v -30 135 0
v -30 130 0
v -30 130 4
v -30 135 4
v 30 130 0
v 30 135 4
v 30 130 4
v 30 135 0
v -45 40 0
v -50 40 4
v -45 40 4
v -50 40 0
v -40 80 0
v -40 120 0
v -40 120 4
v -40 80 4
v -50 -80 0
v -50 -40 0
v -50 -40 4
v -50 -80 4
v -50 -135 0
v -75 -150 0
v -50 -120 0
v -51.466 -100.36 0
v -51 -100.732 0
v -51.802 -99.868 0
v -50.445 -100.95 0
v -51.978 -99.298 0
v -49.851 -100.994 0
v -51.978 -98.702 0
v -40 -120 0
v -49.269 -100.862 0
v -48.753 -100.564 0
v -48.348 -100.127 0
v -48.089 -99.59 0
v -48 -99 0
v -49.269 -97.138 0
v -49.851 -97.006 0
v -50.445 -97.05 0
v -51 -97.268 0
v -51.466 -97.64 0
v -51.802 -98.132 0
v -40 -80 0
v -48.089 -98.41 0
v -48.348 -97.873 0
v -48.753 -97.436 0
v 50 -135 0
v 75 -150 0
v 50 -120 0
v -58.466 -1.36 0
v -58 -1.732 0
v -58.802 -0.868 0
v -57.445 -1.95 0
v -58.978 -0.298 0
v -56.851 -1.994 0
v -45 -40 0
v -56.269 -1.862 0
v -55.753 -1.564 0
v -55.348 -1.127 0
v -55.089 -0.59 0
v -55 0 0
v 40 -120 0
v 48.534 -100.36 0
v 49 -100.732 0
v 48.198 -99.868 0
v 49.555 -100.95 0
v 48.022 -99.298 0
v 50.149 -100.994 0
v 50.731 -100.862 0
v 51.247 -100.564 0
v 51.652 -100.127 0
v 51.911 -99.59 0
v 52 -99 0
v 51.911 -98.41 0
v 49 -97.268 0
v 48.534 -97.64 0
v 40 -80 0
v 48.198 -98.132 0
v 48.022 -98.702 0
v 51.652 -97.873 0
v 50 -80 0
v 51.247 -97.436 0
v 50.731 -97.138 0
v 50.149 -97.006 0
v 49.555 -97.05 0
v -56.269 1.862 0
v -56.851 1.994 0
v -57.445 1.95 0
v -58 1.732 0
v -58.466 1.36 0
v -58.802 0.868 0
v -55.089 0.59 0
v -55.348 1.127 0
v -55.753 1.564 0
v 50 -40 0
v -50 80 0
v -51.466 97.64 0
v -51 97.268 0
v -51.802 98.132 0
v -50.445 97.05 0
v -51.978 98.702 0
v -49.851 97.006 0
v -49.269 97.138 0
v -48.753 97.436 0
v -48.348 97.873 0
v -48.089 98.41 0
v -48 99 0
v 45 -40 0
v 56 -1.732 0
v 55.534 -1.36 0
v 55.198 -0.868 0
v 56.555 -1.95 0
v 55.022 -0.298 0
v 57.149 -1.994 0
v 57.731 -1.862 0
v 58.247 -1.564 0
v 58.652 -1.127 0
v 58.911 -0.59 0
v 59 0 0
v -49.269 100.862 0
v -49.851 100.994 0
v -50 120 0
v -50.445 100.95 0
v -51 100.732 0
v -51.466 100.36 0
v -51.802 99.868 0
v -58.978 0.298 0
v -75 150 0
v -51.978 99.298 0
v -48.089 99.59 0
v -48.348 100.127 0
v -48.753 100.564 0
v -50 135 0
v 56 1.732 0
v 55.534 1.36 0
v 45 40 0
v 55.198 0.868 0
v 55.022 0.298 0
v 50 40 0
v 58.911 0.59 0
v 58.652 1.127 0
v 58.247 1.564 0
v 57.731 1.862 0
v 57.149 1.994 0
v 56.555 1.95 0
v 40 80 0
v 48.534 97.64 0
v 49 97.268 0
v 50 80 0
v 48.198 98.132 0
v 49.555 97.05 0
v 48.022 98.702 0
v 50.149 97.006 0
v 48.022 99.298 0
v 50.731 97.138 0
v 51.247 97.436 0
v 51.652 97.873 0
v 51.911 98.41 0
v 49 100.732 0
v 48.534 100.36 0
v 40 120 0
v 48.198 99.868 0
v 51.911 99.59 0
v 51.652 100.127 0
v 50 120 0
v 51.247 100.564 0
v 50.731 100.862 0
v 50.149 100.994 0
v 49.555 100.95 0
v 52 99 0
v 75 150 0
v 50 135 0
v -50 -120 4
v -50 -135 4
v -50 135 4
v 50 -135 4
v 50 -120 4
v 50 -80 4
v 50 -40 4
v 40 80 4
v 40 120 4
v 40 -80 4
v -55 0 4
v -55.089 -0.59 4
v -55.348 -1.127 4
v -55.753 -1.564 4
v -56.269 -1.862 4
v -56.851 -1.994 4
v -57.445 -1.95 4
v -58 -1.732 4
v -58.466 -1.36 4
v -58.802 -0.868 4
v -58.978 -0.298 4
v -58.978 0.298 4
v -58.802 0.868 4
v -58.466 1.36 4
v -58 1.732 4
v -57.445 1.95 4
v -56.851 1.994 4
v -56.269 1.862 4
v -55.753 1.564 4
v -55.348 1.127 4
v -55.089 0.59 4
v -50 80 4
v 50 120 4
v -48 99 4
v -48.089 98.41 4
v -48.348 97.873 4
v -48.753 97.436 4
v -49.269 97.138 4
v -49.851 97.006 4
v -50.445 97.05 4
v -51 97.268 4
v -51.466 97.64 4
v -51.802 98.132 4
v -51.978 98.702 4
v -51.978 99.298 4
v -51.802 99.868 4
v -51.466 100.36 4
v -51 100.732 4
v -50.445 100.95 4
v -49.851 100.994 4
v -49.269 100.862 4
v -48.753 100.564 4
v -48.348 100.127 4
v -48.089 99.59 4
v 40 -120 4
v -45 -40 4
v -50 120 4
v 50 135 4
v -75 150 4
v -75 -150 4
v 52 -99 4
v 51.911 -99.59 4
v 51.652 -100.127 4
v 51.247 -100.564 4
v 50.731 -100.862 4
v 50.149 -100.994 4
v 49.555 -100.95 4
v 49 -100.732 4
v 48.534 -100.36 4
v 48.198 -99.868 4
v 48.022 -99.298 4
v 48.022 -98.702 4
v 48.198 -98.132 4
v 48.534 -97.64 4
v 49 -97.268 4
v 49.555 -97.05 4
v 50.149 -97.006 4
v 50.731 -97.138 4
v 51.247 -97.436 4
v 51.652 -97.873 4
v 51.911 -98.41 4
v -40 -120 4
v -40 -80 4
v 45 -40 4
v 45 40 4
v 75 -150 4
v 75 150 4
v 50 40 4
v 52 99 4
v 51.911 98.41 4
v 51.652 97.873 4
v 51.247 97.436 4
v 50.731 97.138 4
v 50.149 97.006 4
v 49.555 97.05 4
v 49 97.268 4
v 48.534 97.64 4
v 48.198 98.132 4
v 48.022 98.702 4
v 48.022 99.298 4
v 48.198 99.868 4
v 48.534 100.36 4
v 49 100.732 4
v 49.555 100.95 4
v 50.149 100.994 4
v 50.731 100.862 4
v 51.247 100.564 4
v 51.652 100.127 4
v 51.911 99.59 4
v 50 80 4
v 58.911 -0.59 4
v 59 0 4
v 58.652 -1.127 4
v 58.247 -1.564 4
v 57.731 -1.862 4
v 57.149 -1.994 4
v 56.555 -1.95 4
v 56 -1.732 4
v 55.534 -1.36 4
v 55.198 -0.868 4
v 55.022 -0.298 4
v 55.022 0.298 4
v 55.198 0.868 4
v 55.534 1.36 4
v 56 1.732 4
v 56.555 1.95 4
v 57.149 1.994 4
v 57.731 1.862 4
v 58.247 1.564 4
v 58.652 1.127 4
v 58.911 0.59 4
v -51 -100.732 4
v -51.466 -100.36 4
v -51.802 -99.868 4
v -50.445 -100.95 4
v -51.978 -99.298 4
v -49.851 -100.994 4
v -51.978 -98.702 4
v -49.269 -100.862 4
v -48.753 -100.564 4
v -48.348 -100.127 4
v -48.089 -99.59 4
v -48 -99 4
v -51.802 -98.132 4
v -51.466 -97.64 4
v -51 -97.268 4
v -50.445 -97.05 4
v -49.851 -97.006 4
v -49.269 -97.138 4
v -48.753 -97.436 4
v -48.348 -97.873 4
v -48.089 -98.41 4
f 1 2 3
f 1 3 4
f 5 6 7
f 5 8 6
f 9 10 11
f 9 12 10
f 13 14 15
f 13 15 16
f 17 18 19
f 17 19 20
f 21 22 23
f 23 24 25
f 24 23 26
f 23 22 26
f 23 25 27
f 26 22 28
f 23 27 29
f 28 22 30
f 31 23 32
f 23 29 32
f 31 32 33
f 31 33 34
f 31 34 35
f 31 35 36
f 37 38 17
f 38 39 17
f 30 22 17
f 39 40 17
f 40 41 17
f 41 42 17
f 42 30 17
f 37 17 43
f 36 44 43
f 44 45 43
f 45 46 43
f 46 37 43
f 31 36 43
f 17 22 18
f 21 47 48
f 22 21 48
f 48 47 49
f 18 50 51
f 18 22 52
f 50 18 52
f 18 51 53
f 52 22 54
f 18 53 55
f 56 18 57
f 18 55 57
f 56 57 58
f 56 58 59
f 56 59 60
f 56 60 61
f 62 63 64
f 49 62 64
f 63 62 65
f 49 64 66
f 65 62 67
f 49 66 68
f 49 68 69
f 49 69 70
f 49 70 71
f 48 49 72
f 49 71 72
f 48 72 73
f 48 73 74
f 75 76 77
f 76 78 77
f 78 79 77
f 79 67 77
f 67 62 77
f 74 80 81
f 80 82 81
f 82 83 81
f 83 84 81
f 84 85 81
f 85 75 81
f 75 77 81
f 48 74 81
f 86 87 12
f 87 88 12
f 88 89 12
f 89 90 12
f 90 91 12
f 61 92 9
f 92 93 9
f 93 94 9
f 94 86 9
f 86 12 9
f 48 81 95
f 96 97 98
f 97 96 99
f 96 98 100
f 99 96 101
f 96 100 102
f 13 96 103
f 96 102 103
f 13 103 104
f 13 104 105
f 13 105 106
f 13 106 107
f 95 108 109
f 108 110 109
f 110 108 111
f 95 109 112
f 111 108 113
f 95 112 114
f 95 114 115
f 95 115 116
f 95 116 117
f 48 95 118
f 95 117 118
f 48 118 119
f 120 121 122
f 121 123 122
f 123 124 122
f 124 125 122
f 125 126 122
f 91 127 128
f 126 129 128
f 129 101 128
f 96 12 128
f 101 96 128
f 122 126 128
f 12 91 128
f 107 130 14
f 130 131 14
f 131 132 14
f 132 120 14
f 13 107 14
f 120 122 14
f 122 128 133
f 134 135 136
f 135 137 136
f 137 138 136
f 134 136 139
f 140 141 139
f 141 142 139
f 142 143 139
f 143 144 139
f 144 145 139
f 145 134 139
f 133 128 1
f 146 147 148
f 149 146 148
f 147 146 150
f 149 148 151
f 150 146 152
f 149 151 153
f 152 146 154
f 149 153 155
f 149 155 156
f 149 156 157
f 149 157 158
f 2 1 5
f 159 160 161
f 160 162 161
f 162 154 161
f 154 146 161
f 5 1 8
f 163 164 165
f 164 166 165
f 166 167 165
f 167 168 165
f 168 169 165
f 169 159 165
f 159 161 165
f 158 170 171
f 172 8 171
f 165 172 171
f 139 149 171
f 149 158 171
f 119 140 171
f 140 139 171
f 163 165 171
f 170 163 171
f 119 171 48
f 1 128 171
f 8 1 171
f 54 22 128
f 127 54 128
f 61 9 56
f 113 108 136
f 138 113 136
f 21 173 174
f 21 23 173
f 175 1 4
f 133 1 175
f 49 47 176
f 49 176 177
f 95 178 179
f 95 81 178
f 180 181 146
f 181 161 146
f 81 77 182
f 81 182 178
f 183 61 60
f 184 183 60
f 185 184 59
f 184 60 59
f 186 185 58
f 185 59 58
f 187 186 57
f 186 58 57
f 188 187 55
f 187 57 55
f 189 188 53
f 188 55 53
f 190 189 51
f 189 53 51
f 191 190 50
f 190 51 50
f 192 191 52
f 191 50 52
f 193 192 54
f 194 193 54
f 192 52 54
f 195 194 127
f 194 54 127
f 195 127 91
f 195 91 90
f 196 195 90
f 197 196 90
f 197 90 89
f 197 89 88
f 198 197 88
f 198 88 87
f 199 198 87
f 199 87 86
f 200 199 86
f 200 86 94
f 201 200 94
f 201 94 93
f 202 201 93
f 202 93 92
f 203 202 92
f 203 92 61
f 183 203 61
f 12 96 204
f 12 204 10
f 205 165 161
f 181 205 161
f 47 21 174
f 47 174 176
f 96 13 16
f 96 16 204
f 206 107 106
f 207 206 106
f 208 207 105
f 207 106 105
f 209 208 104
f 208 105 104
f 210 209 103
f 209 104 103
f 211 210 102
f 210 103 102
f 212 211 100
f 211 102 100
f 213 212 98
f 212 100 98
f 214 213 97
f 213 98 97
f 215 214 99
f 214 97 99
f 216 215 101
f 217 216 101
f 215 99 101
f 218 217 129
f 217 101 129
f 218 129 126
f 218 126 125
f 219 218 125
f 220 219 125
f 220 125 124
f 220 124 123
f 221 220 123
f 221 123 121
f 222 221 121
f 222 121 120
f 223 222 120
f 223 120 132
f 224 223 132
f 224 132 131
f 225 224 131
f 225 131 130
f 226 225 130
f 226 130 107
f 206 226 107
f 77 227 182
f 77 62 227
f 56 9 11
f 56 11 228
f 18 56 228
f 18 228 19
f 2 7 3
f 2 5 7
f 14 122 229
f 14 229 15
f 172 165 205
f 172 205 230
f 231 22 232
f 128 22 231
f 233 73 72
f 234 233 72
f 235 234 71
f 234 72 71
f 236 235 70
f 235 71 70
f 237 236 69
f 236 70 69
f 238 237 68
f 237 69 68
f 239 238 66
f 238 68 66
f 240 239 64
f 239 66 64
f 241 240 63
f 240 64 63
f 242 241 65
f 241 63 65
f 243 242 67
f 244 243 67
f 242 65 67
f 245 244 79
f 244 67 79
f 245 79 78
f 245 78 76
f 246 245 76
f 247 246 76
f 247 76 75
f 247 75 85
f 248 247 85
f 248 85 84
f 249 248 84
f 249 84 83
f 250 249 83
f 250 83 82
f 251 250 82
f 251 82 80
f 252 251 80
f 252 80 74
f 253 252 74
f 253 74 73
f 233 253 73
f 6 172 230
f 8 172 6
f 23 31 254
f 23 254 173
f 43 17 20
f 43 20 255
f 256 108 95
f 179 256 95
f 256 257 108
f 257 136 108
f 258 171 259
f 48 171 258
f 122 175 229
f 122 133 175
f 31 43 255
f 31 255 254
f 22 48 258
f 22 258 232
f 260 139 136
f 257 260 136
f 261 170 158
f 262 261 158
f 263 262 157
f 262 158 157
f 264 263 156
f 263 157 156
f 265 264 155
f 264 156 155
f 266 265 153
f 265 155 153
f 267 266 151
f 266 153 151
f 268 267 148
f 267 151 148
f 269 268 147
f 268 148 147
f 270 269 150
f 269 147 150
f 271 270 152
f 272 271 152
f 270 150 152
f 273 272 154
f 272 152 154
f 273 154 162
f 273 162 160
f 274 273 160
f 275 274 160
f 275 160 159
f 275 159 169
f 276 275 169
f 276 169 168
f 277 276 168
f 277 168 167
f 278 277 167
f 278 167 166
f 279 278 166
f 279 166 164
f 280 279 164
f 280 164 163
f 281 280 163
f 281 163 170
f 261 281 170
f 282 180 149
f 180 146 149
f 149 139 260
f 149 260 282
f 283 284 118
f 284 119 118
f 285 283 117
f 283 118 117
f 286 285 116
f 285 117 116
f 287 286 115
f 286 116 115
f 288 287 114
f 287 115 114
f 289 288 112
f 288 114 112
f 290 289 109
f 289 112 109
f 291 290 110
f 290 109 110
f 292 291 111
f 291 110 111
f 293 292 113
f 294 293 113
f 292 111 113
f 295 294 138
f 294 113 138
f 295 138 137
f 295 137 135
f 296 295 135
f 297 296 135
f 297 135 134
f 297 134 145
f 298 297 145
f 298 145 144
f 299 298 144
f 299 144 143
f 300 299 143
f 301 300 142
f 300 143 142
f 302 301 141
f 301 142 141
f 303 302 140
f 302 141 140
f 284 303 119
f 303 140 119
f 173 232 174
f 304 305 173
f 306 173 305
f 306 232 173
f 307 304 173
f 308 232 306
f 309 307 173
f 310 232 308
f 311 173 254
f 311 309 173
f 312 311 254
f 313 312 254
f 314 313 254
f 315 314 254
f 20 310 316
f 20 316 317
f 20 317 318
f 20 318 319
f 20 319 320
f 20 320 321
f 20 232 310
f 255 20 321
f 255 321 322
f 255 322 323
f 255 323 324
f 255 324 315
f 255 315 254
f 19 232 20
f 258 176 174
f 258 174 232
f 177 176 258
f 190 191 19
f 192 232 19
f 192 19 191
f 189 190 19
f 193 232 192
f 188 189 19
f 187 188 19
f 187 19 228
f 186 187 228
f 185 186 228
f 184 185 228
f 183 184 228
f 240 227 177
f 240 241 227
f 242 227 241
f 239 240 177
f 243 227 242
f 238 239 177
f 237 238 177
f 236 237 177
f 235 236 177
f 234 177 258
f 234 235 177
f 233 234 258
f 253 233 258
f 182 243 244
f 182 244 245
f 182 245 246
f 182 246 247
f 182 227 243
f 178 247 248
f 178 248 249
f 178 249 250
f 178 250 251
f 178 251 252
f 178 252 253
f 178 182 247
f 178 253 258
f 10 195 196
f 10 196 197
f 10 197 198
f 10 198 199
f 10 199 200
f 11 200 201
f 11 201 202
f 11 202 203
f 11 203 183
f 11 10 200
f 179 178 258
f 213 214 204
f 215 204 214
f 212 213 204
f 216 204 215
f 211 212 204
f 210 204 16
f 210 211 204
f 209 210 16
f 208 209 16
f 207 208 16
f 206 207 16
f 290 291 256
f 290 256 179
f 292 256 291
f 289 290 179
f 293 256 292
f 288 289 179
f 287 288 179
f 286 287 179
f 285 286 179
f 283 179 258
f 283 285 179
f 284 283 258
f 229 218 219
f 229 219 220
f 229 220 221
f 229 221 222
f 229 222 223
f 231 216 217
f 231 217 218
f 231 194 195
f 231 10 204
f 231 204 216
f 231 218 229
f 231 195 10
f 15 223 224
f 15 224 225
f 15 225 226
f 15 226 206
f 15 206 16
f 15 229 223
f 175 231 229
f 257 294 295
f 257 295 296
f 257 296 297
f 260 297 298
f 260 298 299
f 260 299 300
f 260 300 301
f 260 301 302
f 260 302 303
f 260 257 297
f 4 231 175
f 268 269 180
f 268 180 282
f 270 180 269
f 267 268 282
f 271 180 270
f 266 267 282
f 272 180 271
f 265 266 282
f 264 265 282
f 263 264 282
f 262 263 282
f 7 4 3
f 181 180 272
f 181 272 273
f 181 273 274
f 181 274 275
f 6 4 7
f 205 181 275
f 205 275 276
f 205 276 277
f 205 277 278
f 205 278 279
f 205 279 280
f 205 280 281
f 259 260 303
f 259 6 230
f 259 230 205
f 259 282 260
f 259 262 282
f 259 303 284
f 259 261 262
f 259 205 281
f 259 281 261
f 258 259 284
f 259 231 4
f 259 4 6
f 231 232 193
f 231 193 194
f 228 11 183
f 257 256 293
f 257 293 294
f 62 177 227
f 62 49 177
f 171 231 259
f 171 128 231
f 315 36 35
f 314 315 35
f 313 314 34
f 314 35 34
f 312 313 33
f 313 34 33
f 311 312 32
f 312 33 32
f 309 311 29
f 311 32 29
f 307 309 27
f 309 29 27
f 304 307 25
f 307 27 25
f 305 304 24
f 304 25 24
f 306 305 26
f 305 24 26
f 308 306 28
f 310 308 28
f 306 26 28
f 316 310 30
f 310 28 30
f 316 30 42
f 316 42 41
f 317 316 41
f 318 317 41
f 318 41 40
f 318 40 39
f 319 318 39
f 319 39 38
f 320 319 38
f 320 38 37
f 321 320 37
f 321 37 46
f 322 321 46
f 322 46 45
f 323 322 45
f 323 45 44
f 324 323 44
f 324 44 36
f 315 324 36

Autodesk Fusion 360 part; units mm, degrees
sketch "Sketch1" plane through (0, 0, 0) normal (0, 0, 1) x (1, 0, 0)
  line L0 (-75, 150) -> (75, 150)
  line L1 (75, 150) -> (75, -150)
  line L2 (75, -150) -> (-75, -150)
  line L3 (-75, -150) -> (-75, 150)
  line L4 (-75, 150) -> (75, -150) construction
  line L5 (75, 150) -> (-75, -150) construction
  line L6 (50, 135) -> (-50, 135)
  line L7 (-50, 135) -> (-50, -135)
  line L8 (-50, -135) -> (50, -135)
  line L9 (50, -135) -> (50, 135)
  line L10 (50, 135) -> (-50, -135) construction
  line L11 (-50, 135) -> (50, -135) construction
  line L12 (-30, 135) -> (30, 135)
  line L13 (30, 135) -> (30, 130)
  line L14 (30, 130) -> (-30, 130)
  line L15 (-30, 130) -> (-30, 135)
  line L16 (-50, 40) -> (-45, 40)
  line L17 (-45, 40) -> (-45, -40)
  line L18 (-45, -40) -> (-50, -40)
  line L19 (-50, -40) -> (-50, 40)
  line L20 (-30, -135) -> (30, -135)
  line L21 (30, -135) -> (30, -130)
  line L22 (30, -130) -> (-30, -130)
  line L23 (-30, -130) -> (-30, -135)
  line L24 (50, 40) -> (45, 40)
  line L25 (45, 40) -> (45, -40)
  line L26 (45, -40) -> (50, -40)
  line L27 (50, -40) -> (50, 40)
  line L28 (-50, -80) -> (-40, -80)
  line L29 (-40, -80) -> (-40, -120)
  line L30 (-40, -120) -> (-50, -120)
  line L31 (-50, -120) -> (-50, -80)
  line L32 (50, -120) -> (40, -120)
  line L33 (40, -120) -> (40, -80)
  line L34 (40, -80) -> (50, -80)
  line L35 (50, -80) -> (50, -120)
  line L36 (50, 120) -> (40, 120)
  line L37 (40, 120) -> (40, 80)
  line L38 (40, 80) -> (50, 80)
  line L39 (50, 80) -> (50, 120)
  line L40 (-50, 120) -> (-40, 120)
  line L41 (-40, 120) -> (-40, 80)
  line L42 (-40, 80) -> (-50, 80)
  line L43 (-50, 80) -> (-50, 120)
  dimension "d1" = 300
  dimension "d2" = 150
  dimension "d3" = 270
  dimension "d4" = 100
  dimension "d5" = 60
  dimension "d6" = 20
  dimension "d7" = 5
  dimension "d8" = 80
  dimension "d9" = 95
  dimension "d10" = 5
  dimension "d11" = 60
  dimension "d12" = 5
  dimension "d13" = 20
  dimension "d14" = 80
  dimension "d15" = 5
  dimension "d16" = 95
  dimension "d19" = 10
  dimension "d20" = 40
  dimension "d21" = 40
  dimension "d22" = 10
  dimension "d23" = 40
  dimension "d24" = 40
  dimension "d25" = 10
  dimension "d26" = 40
  dimension "d27" = 40
  dimension "d28" = 10
  dimension "d29" = 40
  dimension "d30" = 40
extrude "Extrude2" add sketch "Sketch1" along normal blind 4 contours L0 L1 L2 L3 | L6 L12 L13 L14 L15 | L9 L36 L37 L38 L39 | L9 L24 L25 L26 L27 | L7 L40 L41 L42 L43 | L9 L32 L33 L34 L35 | L7 L16 L17 L18 L19 | L7 L28 L29 L30 L31
sketch "Sketch2" plane through (0, 0, 0) normal (0, 0, 1) x (1, 0, 0)
  line L0 (0, 0) -> (-57, 0) construction
  circle A0 centre (-57, 0) radius 2
  line L1 (0, 0) -> (57, 0) construction
  circle A1 centre (57, 0) radius 2
  line L2 (0, 0) -> (0, -99) construction
  line L3 (0, -99) -> (-50, -99) construction
  line L4 (0, -99) -> (50, -99) construction
  line L5 (0, 0) -> (0, 99) construction
  line L6 (0, 99) -> (50, 99) construction
  line L7 (0, 99) -> (-50, 99) construction
  circle A2 centre (50, 99) radius 2
  circle A3 centre (-50, 99) radius 2
  circle A4 centre (50, -99) radius 2
  circle A5 centre (-50, -99) radius 2
  dimension "d33" = 57
  dimension "d35" = 4
  dimension "d36" = 57
  dimension "d37" = 4
  dimension "d38" = 99
  dimension "d39" = 50
  dimension "d40" = 50
  dimension "d41" = 99
  dimension "d42" = 50
  dimension "d43" = 4
  dimension "d44" = 4
  dimension "d45" = 50
  dimension "d46" = 4
  dimension "d47" = 4
extrude "Extrude3" cut sketch "Sketch2" along normal through all
sketch "Sketch3" plane through (0, 0, 0) normal (0, 0, -1) x (1, 0, 0)
  circle A0 centre (57, 0) radius 2
  circle A1 centre (-50, 99) radius 2
  circle A2 centre (-50, -99) radius 2
  circle A3 centre (-57, 0) radius 2
  circle A4 centre (50, 99) radius 2
  circle A5 centre (50, -99) radius 2
  line L0 (50, -120) -> (50, -135)
  line L1 (50, -135) -> (30, -135)
  line L2 (30, -135) -> (30, -130)
  line L3 (30, -130) -> (-30, -130)
  line L4 (-30, -130) -> (-30, -135)
  line L5 (-30, -135) -> (-50, -135)
  line L6 (-50, -135) -> (-50, -120)
  line L7 (-50, -120) -> (-40, -120)
  line L8 (-40, -120) -> (-40, -80)
  line L9 (-40, -80) -> (-50, -80)
  line L10 (-50, -80) -> (-50, -40)
  line L11 (-50, -40) -> (-45, -40)
  line L12 (-45, -40) -> (-45, 40)
  line L13 (-45, 40) -> (-50, 40)
  line L14 (-50, 40) -> (-50, 80)
  line L15 (-50, 80) -> (-40, 80)
  line L16 (-40, 80) -> (-40, 120)
  line L17 (-40, 120) -> (-50, 120)
  line L18 (-50, 120) -> (-50, 135)
  line L19 (-50, 135) -> (50, 135)
  line L20 (50, 135) -> (50, 120)
  line L21 (50, 120) -> (40, 120)
  line L22 (40, 120) -> (40, 80)
  line L23 (40, 80) -> (50, 80)
  line L24 (50, 80) -> (50, 40)
  line L25 (50, 40) -> (45, 40)
  line L26 (45, 40) -> (45, -40)
  line L27 (45, -40) -> (50, -40)
  line L28 (50, -40) -> (50, -80)
  line L29 (50, -80) -> (40, -80)
  line L30 (40, -80) -> (40, -120)
  line L31 (40, -120) -> (50, -120)
  line L32 (75, 150) -> (-75, 150)
  line L33 (-75, 150) -> (-75, -150)
  line L34 (-75, -150) -> (75, -150)
  line L35 (75, -150) -> (75, 150)
